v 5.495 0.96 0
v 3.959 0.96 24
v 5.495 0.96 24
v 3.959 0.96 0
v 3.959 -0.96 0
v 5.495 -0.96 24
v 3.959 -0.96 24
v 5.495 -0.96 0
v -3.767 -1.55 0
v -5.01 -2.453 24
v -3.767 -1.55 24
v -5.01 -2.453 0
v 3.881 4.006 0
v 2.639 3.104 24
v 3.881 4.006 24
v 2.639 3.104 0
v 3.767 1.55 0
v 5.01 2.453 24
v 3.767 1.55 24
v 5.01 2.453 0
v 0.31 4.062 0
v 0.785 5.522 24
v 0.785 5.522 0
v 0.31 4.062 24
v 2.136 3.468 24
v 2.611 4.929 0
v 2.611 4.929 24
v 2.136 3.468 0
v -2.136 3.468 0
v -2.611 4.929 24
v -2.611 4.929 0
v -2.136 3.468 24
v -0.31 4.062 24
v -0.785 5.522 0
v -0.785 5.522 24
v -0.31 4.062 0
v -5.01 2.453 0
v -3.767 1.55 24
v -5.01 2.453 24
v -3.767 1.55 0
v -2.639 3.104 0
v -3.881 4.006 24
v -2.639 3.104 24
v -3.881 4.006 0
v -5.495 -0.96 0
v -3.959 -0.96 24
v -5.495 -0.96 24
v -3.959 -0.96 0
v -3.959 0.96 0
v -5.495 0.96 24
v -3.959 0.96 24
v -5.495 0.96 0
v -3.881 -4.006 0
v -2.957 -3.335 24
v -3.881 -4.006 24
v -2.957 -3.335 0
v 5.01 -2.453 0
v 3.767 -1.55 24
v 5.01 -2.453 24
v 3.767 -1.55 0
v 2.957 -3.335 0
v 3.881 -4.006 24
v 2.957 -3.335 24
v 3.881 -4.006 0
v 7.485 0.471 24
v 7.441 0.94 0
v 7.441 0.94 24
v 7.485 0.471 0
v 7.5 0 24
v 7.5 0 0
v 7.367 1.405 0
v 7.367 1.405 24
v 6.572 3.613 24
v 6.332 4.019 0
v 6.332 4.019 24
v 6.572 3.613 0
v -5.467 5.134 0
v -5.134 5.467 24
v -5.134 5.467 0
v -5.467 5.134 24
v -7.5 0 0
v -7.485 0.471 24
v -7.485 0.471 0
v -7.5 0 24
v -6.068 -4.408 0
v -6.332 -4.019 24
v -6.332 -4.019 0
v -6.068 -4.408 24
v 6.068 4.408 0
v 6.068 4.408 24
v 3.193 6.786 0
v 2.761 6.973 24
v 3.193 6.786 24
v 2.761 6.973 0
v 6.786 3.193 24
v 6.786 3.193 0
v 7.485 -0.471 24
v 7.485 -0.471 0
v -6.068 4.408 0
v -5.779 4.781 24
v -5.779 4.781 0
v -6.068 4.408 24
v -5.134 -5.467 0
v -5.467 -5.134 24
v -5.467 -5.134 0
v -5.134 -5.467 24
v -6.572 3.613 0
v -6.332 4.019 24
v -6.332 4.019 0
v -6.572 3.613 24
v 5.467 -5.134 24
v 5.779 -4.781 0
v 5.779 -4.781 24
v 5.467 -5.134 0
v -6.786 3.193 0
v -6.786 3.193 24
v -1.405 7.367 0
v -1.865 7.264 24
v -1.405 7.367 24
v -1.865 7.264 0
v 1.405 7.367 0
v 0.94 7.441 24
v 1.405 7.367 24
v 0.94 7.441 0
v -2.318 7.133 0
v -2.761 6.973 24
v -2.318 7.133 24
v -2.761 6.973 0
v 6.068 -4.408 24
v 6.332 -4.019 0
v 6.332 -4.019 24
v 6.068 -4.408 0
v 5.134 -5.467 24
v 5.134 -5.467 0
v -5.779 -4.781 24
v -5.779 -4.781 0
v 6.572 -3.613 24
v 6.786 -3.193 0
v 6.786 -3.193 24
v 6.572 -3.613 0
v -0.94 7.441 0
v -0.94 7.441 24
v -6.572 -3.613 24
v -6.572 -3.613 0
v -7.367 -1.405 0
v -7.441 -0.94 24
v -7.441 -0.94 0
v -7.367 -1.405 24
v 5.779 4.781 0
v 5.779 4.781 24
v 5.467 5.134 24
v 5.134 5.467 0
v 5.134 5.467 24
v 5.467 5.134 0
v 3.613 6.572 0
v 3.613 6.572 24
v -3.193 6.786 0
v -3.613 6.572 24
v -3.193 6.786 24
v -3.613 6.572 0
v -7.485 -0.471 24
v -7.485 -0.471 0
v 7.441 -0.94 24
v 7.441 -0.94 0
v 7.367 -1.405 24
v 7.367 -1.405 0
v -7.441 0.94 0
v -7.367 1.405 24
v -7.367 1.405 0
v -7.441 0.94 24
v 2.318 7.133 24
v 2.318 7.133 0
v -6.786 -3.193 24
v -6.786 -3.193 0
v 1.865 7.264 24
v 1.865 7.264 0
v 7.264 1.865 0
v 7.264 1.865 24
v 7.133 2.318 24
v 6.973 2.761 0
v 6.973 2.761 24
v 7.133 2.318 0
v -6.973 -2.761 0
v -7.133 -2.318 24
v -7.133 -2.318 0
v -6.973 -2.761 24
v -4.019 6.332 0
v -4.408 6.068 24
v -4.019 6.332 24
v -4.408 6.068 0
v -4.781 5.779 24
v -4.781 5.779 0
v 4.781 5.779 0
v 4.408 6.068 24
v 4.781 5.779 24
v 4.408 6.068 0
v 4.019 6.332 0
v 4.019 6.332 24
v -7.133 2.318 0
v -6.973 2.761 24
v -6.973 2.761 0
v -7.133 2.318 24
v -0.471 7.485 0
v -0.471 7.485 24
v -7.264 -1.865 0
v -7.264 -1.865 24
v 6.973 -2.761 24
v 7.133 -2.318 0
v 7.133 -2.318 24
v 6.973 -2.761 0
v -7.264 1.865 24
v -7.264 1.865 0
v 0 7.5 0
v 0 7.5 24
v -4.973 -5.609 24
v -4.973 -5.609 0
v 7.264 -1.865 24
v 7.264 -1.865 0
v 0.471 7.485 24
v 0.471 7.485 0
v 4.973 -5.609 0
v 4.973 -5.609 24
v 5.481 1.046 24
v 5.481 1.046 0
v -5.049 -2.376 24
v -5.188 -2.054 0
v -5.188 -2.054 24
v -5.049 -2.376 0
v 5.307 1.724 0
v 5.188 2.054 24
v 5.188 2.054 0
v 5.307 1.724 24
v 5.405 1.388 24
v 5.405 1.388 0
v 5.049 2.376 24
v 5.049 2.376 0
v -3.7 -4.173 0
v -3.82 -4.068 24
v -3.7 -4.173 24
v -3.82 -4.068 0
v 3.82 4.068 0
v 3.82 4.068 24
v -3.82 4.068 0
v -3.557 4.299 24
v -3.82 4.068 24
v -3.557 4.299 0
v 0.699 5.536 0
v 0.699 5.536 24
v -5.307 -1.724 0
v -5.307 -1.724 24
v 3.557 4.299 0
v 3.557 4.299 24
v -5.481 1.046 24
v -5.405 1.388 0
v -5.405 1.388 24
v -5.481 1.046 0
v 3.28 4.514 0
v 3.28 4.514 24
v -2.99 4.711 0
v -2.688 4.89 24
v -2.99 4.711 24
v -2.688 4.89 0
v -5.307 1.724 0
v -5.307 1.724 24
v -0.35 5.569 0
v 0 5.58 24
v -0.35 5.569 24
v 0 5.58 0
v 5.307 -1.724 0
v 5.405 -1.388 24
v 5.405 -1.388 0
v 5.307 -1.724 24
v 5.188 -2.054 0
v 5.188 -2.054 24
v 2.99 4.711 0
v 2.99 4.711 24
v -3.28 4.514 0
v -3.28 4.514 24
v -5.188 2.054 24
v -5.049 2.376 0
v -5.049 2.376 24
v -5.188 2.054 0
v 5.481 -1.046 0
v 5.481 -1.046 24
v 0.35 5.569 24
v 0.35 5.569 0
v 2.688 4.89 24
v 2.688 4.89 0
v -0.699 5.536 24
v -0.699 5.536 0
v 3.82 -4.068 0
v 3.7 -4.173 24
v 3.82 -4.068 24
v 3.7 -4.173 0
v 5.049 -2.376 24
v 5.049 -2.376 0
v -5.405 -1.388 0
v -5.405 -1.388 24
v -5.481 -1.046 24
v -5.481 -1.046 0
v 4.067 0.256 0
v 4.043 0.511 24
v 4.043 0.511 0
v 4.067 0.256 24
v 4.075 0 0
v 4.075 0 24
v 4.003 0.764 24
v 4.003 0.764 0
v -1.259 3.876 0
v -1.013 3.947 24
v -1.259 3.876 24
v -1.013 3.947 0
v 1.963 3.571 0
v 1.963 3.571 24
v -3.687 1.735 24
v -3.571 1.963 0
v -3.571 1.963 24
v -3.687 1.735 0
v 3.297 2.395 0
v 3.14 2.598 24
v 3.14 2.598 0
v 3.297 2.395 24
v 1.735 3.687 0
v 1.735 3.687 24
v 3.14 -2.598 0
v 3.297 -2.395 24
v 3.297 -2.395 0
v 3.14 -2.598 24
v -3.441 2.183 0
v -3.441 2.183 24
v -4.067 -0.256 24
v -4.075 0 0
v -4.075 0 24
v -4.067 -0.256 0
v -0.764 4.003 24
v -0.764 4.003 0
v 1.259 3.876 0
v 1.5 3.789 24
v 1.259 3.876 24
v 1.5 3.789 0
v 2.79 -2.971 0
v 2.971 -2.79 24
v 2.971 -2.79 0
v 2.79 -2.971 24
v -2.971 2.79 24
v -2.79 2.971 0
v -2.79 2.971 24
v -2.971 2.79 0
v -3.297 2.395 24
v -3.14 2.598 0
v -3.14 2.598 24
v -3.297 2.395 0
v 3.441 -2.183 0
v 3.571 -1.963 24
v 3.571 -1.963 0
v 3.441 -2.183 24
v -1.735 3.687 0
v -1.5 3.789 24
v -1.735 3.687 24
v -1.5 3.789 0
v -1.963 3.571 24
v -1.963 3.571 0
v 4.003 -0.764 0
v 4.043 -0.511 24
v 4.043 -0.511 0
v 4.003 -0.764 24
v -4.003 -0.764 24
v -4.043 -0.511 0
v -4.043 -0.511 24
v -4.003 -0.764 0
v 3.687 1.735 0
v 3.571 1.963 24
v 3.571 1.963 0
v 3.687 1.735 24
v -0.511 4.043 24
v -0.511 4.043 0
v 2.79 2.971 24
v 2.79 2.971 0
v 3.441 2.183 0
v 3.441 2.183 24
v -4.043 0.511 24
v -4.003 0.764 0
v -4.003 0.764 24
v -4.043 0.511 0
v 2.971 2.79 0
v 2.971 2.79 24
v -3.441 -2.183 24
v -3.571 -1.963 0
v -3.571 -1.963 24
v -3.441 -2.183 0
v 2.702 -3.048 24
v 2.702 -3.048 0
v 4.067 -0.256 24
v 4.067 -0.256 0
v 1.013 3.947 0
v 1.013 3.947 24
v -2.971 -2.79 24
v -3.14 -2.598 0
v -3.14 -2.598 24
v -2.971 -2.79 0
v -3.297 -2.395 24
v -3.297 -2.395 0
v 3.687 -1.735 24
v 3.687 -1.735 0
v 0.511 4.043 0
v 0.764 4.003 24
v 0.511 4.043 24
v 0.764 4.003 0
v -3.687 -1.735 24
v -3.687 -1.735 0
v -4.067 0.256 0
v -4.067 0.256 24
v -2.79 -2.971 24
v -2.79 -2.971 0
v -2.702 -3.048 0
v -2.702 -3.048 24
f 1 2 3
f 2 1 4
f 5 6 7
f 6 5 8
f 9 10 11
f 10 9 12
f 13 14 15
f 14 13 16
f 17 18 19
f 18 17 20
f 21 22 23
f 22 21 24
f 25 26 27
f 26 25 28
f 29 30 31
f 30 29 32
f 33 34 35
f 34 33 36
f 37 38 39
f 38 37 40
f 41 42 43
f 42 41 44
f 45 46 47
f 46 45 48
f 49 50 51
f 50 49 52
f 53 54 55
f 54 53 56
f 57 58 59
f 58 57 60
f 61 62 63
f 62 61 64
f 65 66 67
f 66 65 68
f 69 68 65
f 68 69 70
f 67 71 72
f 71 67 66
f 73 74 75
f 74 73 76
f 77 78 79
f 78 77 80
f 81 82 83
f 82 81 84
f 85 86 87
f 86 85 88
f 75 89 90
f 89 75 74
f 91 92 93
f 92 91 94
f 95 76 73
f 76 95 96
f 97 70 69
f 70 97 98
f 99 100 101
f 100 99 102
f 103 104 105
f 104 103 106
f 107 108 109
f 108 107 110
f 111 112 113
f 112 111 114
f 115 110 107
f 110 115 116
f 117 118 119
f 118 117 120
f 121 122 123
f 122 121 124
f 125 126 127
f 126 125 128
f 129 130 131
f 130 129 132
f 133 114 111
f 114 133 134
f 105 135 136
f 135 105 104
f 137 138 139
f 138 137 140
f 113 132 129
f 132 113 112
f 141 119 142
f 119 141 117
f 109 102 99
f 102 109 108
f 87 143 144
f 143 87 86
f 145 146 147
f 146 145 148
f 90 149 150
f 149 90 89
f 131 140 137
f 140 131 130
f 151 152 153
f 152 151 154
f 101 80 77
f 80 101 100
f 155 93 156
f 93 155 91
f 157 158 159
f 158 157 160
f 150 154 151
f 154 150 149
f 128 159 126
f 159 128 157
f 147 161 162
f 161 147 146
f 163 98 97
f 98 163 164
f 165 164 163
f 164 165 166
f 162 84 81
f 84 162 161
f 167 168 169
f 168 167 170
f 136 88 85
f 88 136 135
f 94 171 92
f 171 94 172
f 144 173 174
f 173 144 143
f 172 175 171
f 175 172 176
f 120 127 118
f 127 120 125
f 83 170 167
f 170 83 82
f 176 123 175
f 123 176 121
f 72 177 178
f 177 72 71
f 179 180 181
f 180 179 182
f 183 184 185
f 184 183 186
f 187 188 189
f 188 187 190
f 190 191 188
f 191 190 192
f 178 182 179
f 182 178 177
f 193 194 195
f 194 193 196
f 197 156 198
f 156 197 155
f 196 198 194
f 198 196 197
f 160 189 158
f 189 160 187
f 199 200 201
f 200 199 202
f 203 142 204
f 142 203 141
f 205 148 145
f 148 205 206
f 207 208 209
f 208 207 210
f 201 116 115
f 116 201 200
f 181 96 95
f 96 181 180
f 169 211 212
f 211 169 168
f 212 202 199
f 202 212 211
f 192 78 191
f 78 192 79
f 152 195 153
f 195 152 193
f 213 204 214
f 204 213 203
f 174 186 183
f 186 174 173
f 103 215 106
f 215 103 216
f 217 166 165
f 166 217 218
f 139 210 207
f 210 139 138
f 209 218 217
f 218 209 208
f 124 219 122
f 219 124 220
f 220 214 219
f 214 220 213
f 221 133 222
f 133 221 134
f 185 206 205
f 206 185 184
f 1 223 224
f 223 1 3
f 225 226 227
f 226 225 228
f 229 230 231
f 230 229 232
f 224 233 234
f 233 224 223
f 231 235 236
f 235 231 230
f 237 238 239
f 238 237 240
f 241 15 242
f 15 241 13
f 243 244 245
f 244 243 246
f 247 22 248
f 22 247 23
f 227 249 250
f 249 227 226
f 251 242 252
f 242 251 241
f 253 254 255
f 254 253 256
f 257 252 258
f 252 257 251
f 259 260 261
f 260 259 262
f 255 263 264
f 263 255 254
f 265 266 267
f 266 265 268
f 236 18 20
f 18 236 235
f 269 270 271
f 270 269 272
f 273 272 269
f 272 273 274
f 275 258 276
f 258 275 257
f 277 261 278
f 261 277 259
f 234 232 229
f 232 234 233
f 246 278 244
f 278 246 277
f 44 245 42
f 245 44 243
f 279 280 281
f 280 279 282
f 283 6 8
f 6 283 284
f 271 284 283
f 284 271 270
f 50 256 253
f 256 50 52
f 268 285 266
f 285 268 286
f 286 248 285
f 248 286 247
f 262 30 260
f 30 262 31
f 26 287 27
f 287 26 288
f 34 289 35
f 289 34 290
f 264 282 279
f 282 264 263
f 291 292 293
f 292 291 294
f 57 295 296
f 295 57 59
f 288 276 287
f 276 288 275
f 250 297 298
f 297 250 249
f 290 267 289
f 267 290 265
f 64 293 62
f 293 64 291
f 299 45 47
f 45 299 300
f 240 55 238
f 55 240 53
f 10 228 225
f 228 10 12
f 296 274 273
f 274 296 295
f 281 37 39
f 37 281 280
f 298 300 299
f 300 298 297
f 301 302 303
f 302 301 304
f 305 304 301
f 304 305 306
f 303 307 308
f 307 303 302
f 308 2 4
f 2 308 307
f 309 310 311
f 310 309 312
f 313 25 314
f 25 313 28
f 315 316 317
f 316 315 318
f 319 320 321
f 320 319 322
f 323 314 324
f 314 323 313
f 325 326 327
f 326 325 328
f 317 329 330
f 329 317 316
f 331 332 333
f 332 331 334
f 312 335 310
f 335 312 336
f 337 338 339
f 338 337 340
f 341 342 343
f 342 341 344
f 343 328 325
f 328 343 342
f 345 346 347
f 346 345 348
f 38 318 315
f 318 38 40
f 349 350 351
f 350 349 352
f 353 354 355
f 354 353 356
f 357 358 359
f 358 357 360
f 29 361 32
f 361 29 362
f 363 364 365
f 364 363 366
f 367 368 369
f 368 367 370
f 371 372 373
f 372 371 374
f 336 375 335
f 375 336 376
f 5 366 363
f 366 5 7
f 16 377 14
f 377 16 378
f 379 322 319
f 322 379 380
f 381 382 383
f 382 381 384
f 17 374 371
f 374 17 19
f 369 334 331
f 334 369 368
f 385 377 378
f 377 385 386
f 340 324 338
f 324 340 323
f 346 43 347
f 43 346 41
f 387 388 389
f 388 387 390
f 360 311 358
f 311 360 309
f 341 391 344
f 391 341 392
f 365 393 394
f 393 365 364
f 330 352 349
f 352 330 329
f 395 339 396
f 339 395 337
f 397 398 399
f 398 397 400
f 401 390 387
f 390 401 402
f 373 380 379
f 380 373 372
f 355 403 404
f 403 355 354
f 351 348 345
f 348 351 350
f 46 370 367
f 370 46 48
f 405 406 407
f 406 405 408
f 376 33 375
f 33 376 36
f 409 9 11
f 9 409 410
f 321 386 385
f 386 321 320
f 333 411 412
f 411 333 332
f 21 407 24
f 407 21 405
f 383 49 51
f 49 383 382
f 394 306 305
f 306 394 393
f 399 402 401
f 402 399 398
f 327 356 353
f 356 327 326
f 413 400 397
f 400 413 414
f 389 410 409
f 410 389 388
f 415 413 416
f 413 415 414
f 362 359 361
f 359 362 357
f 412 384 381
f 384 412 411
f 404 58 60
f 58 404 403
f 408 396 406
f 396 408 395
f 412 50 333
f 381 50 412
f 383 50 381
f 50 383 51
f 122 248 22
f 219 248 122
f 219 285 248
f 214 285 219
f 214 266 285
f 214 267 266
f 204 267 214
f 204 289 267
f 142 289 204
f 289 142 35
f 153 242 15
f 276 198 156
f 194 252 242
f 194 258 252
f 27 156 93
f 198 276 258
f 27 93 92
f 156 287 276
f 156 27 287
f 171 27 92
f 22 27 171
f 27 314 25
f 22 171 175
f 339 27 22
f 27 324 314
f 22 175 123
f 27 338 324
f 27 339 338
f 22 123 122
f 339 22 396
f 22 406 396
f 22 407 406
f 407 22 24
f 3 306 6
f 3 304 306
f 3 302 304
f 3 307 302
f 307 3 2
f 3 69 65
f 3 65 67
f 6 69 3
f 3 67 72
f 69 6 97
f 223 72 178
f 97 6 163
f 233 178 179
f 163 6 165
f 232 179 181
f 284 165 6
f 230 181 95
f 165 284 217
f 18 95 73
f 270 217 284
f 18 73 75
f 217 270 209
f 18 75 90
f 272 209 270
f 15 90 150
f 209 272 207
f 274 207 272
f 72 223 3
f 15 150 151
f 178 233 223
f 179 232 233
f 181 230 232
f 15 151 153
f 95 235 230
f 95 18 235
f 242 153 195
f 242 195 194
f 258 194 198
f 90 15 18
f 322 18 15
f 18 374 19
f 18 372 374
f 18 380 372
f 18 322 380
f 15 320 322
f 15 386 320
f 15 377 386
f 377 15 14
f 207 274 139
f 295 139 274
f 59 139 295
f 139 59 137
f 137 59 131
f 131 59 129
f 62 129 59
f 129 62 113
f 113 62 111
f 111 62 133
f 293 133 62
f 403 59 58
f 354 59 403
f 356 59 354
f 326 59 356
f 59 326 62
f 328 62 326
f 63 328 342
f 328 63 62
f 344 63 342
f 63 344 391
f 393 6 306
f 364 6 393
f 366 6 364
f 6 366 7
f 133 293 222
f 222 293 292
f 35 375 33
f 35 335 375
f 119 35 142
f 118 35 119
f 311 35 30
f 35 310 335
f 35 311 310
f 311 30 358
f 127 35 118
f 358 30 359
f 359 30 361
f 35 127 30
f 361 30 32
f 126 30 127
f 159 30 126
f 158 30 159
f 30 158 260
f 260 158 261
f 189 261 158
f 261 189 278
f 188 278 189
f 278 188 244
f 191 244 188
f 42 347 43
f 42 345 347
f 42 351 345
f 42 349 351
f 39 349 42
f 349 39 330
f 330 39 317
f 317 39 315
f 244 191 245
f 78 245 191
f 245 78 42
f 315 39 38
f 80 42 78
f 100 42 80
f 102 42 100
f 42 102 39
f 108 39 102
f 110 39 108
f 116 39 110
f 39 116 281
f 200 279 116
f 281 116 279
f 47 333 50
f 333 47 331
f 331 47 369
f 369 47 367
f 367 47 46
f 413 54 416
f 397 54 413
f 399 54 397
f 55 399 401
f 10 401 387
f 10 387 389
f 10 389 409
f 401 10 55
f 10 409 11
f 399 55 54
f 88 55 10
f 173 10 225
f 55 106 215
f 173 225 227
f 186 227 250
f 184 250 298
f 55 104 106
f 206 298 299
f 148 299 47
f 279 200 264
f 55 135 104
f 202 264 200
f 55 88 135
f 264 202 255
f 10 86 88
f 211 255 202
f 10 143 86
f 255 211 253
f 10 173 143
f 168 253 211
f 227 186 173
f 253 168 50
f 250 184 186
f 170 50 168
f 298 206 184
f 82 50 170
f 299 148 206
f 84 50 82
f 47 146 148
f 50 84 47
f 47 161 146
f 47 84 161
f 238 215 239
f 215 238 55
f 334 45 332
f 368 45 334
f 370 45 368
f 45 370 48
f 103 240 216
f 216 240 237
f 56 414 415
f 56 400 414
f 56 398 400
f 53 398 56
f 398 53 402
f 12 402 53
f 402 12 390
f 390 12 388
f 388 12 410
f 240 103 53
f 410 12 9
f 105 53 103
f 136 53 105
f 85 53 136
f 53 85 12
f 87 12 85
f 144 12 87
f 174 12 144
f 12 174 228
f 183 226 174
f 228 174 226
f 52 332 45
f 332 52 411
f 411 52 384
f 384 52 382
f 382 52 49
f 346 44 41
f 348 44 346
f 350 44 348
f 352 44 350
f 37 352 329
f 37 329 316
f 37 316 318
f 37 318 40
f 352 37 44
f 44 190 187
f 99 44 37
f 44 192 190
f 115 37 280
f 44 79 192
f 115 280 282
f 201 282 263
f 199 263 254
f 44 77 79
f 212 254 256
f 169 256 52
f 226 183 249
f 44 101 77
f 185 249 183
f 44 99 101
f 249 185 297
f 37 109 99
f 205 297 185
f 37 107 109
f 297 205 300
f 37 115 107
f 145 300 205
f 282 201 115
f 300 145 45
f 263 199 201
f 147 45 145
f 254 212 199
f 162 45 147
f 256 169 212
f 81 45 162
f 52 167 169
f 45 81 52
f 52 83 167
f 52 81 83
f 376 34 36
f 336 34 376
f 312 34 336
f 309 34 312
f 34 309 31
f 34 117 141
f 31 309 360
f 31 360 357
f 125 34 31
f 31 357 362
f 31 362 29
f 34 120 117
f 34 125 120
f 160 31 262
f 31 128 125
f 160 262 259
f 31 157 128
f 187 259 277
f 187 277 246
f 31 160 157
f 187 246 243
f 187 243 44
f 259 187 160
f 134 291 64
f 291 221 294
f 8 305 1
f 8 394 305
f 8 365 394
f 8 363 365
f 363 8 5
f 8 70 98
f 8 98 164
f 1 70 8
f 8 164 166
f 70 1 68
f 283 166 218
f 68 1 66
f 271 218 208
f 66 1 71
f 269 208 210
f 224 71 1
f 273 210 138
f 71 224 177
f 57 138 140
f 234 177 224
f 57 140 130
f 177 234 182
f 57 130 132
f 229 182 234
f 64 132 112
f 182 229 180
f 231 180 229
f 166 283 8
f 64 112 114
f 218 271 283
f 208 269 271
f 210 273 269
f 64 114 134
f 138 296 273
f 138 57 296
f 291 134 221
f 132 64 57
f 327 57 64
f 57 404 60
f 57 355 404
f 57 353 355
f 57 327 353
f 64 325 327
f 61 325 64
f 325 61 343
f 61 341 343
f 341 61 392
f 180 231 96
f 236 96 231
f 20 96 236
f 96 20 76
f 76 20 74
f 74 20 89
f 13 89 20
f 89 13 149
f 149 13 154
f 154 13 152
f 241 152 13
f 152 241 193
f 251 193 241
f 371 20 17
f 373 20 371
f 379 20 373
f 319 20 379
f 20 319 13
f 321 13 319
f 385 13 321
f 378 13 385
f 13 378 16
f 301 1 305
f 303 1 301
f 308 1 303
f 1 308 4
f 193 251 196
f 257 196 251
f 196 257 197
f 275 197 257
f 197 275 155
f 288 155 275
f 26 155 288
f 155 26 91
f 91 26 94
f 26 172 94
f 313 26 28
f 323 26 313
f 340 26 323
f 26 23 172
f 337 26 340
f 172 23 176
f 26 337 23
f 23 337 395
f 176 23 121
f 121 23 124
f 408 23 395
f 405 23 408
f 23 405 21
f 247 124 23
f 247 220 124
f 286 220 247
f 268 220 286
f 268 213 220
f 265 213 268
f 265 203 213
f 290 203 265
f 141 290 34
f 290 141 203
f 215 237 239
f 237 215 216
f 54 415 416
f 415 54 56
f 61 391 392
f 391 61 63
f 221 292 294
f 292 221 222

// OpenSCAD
// file: se/antoneliasson/operations.scad
/*
 * A library of transformations and operations on objects.
 *
 * Copyright (c) 2017 Anton Eliasson
 *
 * MIT License
 */

/*
 * Alias for linear_extrude, without the need to name the height parameter.
 */
module linextr(h) {
	linear_extrude(height=h) children();
}

/*
 * Mirror children through the XZ plane, the YZ plane, and both, resulting in
 * four copies around the origin.
 */
module fourwaymirror() {
	children();
	mirror([1, 0, 0]) children();
	mirror([0, 1, 0]) children();
	mirror([1, 0, 0]) mirror([0, 1, 0]) children();
}

module mirrorXZ() {
    children();
    mirror([0, 1, 0]) children();
}

module mirrorYZ() {
	children();
	mirror([1, 0, 0]) children();
}

// TODO fourwaymirror = mirrorXZ mirrorYZ
// file: se/antoneliasson/2d/shapes.scad
/*
 * A library of (at the moment) 2D shapes.
 *
 * Copyright (c) 2017 Anton Eliasson
 *
 * MIT License
 */

/*
 * Rounded rectangle (1 corner)
 *
 * Right angle in origin, rounded corner furthest from origin.
 */
module rrect1(x, y, r) {
	assert(x >= 2*r && y >= 2*r);

	hull () {
		polygon([[0, 0], [x, 0], [0, y]]);
		translate([x-r, y-r, 0]) circle(r=r);
	}
}

/*
 * Rounded square (1 corner)
 *
 * Like rrect1 but equilateral.
 */
module rsquare1(s, r) {
	rrect1(s, s, r);
}

/*
 * Rounded rectangle (all 4 corners)
 */
module rrect4(x, y, r) {
	offset(r=r) offset(delta=-r) square([x, y], true);
}

/*
 * Rounded square (all 4 corners)
 *
 * Like rrect4 but equilateral.
 */
module rsquare4(s, r) {
	rrect4(s, s, r);
}

/*
 * Triangle with right angle in origin.
 */
module triangle(x, y) {
	polygon([[0, 0], [x, 0], [0, y]]);
}

module trapezoid(a, b, h, skew) {
	polygon([[0, 0], [a, 0], [skew+b, h], [skew, h]]);
}
// main file
 /*
 * Customizable Linear Bushing - https://www.thingiverse.com/thing:2202854
 * by Dennis Hofmann - https://www.thingiverse.com/mightynozzle/about
 * created 2017-03-25
 * updated 2018-02-15
 * version v1.8
 *
 * Changelog
 * --------------
 * v1.8:
 *      - groove option added
 * v1.7:
 *      - fixed inner diameter
 * v1.6:
 *      - added chamfer angle option
 * v1.5:
 *      - fixed graphic glitch
 * v1.4:
 *      - added chamfer option
 *
 * v1.1-1.3:
 *      - initial model with minor changes in description
 *
 * --------------
 * 
 * This work is licensed under the Creative Commons - Attribution - Non-Commercial license.
 * https://creativecommons.org/licenses/by-nc/3.0/
 */
 
 // Parameter Section //
//-------------------//

/* [Bushing Settings] */

// Equals dr in technical diagrams. Use the outer diameter of the rod + tolerance value of your printer. Do some test prints before print a whole set of bushings. Best way in my case is to choose the bushing where can push it in with some effort on the rod and slide it by hand without any tools. Then slide it back and forth along the rod, until the bushing has the expected behavior. I suggest you not to use any drill or heat. The sliding of the bushing generates enough heat from its friction against the rod. Standard values: 6.00 for LM6(L)UU, 8.00 (default 8.15) for LM8(L)UU, 10.00 for LM10(L)UU, 12.00 for LM12(L)UU, 16.00 for LM16UU, ...
inner_diameter_in_millimeter = 8.15;

// Equals D in technical diagrams. Use the inner diameter of housing where the bushing sits + tolerance value of your printer. Depends on the filament you use and the total wall thickness of the bushings, the bushing shouldn't fit to tight in the housing. Standard values: 12.0 for LM6(L)UU, 15.0 (default) for LM8(L)UU, 19.0 for LM10(L)UU, 21.0 for LM12(L)UU, 28.0 for LM16UU, ...
outer_diameter_in_millimeter = 15.0; 

// Equals L in technical diagrams. Standard values: 19.0 for LM6UU, 24.0 for LM8UU, 29.0 for LM10UU, 30.0 for LM12UU, 35.0 for LM6LUU, 37.0 for LM16UU, 45.0 for LM8LUU, 55.0 for LM10LUU, 57.0 for LM12LUU, ...
bushing_length_in_millimeter = 24.0;

// Use a value to get straight primeters without any zigzag between the outer and inner perimeter. I use the value of 0.48 for 0.4 nozzle. This is the auto extrusion width of 0.48 of simplify3d. More information about this in the description of this design on thingiverse.
extrusion_width_in_millimeter = 0.48; 

// Use even numbers. E.g. 4 for LM8(L)UU. Don't forget to set the perimeter number in your Slicer! 
number_of_perimeters = 4; //[2:2:10]

// Choose a number to provide a gap between the teeth in the bushing. E.g. 8 or 10 for LM8(L)UU. The tooth width depends on the extrusion_width_in_millimeter and the number_of_perimeters.
number_of_teeth = 10; //[3:20]

// Radius of the chamfer. Set a chamfer if you want to insert the rod easier. This also helps if your prints tends to create elephant foot in the first few layers. A value between 0.3 and 1.0 might be a good value. Set a value above 0 might destroy the preview of the bushing. But the resulting stl-File will be correct.
chamfer_radius_in_millimeter = 0.0;

// Set the angle of the chamfer. 
chamfer_angle_in_degree = 55.0; // [30:75]

// Equals W in technical diagram. 1.1 for LM6/8(L)UU, 1.3 for LM10/12/13(L)UU, 1.6 for LM16/20(L)UU, 1.85 for LM25/30(L)UU, 2.1 for LM35/40(L)UU, 2.6 for LM50(L)UU, 3.15 for LM60(L)UU
groove_length_in_millimeter = 0;

// Equals D1 in technical diagram. 11.5 for LM6(L)UU, 14.3 for LM8(L)UU, 18.0 for LM10(L)UU, 20.0 for LM12(L)UU, 22.0 for LM13(L)UU, 27.0 for LM16(L)UU, 30.5 for LM20(L)UU, 38.0 for LM25(L)UU, 43.0 for LM30(L)UU, 49.0 for LM35(L)UU, 57.0 for LM40(L)UU, 76.5 for LM50(L)UU, 86.5 for LM60(L)UU
groove_diameter_in_millimeter = 0;

// Equals B in technical diagram. Outer distance between both grooves. 13.5 for LM6UU, 17.5 for LM8UU, 22.0 for LM10UU, 23.0 for LM12UU, 26.5 for LM16UU, 27.0 for LM6LUU, 35.0 for LM8UU, 44.0 for LM10LUU, 46.0 for LM12LUU, 53.0 for LM16LUU
groove_distance_in_millimeter = 0;

/* [Hidden] */
inner_dia = inner_diameter_in_millimeter;
outer_dia = outer_diameter_in_millimeter;
bushing_l = bushing_length_in_millimeter;
extrusion_w = extrusion_width_in_millimeter;
perimeters = number_of_perimeters;
teeth = number_of_teeth;
chamfer_r = chamfer_radius_in_millimeter;
chamfer_h = tan(chamfer_angle_in_degree) * chamfer_r;
groove_l = groove_length_in_millimeter;
groove_dia = groove_diameter_in_millimeter;
groove_d = groove_distance_in_millimeter;


$fn=100;

 // Program Section //
//-----------------//
use <se/antoneliasson/2d/shapes.scad>;
use <se/antoneliasson/operations.scad>;

color("HotPink") difference() {
    bushing();
    if(chamfer_r > 0) {
        chamfer_cut();
        translate([0, 0, bushing_l]) {
            rotate([180,0,0]) {
                chamfer_cut();
            }
        }
    }
    groove_cut();
    cutout_offset = 1.5;
    linextr(bushing_length_in_millimeter)
        mirrorYZ()
                translate([0, -outer_diameter_in_millimeter/2, 0])
                        triangle(inner_diameter_in_millimeter-cutout_offset, outer_diameter_in_millimeter/2);
}


 // Module Section //
//----------------//

module bushing() {
    translate([0, 0, bushing_l / 2]) {
        difference() {
            union() {
                difference() {
                    for(tooth = [0 : teeth - 1])
                        rotate([0, 0, 360 / teeth * tooth]) {
                            translate([outer_dia / 4, 0, 0]) {
                                cube([outer_dia / 2, extrusion_w * perimeters, bushing_l + 1], center = true);
                            }
                        }
                        translate([0, 0, -bushing_l / 2-1]) {
                            ring(outer_dia * 2, outer_dia, bushing_l + 2);
                        }
                    }
                    translate([0, 0, -bushing_l / 2 - 1]) {
                        ring(outer_dia, outer_dia - extrusion_w * perimeters * 2, bushing_l + 2);
                    }
            }
            cylinder(d = inner_dia, h = bushing_l + 2, center = true);
            translate([0, 0, bushing_l / 2]) {
                cylinder(d = outer_dia + 1, h = 2, $f = 16);
            }
            translate([0, 0, -(bushing_l / 2 + 2)]) {
                cylinder(d = outer_dia + 1, h = 2, $f = 16);
            }
        }
    }
}

module ring(d1, d2, height) {
    difference() {
        cylinder(d = d1, h = height, center = false);
        cylinder(d = d2, h = height, center = false);
    }
}

module chamfer_cut() {
    union() {
        difference() {
            translate([0, 0, -1]) {
                cylinder(d = outer_dia + 1, h = chamfer_h + 1);
            }
            intersection() {
                cylinder(d = outer_dia, h = chamfer_h);
                cylinder(d1 = outer_dia - chamfer_r * 2, d2 = outer_dia, h = chamfer_h);
            }
        }
        translate([0, 0, -chamfer_h]) {
            intersection() {
                cylinder(d = inner_dia + chamfer_r * 4, h = chamfer_h * 2);
                cylinder(d1 = inner_dia + chamfer_r * 4, d2 = inner_dia, h = chamfer_h * 2);
            }
        }
        translate([0, 0, -10]) {
            cylinder(d = outer_dia + 1, h = 10);
        }
    }
}

module groove_cut() {
    translate([0, 0, bushing_l / 2 - groove_d / 2]) {
        ring(outer_dia + 1, groove_dia, groove_l);
    }
    translate([0, 0, bushing_l - ((bushing_l / 2) - (groove_d / 2) + groove_l)]) {
        ring(outer_dia + 1, groove_dia, groove_l);
    }
}
